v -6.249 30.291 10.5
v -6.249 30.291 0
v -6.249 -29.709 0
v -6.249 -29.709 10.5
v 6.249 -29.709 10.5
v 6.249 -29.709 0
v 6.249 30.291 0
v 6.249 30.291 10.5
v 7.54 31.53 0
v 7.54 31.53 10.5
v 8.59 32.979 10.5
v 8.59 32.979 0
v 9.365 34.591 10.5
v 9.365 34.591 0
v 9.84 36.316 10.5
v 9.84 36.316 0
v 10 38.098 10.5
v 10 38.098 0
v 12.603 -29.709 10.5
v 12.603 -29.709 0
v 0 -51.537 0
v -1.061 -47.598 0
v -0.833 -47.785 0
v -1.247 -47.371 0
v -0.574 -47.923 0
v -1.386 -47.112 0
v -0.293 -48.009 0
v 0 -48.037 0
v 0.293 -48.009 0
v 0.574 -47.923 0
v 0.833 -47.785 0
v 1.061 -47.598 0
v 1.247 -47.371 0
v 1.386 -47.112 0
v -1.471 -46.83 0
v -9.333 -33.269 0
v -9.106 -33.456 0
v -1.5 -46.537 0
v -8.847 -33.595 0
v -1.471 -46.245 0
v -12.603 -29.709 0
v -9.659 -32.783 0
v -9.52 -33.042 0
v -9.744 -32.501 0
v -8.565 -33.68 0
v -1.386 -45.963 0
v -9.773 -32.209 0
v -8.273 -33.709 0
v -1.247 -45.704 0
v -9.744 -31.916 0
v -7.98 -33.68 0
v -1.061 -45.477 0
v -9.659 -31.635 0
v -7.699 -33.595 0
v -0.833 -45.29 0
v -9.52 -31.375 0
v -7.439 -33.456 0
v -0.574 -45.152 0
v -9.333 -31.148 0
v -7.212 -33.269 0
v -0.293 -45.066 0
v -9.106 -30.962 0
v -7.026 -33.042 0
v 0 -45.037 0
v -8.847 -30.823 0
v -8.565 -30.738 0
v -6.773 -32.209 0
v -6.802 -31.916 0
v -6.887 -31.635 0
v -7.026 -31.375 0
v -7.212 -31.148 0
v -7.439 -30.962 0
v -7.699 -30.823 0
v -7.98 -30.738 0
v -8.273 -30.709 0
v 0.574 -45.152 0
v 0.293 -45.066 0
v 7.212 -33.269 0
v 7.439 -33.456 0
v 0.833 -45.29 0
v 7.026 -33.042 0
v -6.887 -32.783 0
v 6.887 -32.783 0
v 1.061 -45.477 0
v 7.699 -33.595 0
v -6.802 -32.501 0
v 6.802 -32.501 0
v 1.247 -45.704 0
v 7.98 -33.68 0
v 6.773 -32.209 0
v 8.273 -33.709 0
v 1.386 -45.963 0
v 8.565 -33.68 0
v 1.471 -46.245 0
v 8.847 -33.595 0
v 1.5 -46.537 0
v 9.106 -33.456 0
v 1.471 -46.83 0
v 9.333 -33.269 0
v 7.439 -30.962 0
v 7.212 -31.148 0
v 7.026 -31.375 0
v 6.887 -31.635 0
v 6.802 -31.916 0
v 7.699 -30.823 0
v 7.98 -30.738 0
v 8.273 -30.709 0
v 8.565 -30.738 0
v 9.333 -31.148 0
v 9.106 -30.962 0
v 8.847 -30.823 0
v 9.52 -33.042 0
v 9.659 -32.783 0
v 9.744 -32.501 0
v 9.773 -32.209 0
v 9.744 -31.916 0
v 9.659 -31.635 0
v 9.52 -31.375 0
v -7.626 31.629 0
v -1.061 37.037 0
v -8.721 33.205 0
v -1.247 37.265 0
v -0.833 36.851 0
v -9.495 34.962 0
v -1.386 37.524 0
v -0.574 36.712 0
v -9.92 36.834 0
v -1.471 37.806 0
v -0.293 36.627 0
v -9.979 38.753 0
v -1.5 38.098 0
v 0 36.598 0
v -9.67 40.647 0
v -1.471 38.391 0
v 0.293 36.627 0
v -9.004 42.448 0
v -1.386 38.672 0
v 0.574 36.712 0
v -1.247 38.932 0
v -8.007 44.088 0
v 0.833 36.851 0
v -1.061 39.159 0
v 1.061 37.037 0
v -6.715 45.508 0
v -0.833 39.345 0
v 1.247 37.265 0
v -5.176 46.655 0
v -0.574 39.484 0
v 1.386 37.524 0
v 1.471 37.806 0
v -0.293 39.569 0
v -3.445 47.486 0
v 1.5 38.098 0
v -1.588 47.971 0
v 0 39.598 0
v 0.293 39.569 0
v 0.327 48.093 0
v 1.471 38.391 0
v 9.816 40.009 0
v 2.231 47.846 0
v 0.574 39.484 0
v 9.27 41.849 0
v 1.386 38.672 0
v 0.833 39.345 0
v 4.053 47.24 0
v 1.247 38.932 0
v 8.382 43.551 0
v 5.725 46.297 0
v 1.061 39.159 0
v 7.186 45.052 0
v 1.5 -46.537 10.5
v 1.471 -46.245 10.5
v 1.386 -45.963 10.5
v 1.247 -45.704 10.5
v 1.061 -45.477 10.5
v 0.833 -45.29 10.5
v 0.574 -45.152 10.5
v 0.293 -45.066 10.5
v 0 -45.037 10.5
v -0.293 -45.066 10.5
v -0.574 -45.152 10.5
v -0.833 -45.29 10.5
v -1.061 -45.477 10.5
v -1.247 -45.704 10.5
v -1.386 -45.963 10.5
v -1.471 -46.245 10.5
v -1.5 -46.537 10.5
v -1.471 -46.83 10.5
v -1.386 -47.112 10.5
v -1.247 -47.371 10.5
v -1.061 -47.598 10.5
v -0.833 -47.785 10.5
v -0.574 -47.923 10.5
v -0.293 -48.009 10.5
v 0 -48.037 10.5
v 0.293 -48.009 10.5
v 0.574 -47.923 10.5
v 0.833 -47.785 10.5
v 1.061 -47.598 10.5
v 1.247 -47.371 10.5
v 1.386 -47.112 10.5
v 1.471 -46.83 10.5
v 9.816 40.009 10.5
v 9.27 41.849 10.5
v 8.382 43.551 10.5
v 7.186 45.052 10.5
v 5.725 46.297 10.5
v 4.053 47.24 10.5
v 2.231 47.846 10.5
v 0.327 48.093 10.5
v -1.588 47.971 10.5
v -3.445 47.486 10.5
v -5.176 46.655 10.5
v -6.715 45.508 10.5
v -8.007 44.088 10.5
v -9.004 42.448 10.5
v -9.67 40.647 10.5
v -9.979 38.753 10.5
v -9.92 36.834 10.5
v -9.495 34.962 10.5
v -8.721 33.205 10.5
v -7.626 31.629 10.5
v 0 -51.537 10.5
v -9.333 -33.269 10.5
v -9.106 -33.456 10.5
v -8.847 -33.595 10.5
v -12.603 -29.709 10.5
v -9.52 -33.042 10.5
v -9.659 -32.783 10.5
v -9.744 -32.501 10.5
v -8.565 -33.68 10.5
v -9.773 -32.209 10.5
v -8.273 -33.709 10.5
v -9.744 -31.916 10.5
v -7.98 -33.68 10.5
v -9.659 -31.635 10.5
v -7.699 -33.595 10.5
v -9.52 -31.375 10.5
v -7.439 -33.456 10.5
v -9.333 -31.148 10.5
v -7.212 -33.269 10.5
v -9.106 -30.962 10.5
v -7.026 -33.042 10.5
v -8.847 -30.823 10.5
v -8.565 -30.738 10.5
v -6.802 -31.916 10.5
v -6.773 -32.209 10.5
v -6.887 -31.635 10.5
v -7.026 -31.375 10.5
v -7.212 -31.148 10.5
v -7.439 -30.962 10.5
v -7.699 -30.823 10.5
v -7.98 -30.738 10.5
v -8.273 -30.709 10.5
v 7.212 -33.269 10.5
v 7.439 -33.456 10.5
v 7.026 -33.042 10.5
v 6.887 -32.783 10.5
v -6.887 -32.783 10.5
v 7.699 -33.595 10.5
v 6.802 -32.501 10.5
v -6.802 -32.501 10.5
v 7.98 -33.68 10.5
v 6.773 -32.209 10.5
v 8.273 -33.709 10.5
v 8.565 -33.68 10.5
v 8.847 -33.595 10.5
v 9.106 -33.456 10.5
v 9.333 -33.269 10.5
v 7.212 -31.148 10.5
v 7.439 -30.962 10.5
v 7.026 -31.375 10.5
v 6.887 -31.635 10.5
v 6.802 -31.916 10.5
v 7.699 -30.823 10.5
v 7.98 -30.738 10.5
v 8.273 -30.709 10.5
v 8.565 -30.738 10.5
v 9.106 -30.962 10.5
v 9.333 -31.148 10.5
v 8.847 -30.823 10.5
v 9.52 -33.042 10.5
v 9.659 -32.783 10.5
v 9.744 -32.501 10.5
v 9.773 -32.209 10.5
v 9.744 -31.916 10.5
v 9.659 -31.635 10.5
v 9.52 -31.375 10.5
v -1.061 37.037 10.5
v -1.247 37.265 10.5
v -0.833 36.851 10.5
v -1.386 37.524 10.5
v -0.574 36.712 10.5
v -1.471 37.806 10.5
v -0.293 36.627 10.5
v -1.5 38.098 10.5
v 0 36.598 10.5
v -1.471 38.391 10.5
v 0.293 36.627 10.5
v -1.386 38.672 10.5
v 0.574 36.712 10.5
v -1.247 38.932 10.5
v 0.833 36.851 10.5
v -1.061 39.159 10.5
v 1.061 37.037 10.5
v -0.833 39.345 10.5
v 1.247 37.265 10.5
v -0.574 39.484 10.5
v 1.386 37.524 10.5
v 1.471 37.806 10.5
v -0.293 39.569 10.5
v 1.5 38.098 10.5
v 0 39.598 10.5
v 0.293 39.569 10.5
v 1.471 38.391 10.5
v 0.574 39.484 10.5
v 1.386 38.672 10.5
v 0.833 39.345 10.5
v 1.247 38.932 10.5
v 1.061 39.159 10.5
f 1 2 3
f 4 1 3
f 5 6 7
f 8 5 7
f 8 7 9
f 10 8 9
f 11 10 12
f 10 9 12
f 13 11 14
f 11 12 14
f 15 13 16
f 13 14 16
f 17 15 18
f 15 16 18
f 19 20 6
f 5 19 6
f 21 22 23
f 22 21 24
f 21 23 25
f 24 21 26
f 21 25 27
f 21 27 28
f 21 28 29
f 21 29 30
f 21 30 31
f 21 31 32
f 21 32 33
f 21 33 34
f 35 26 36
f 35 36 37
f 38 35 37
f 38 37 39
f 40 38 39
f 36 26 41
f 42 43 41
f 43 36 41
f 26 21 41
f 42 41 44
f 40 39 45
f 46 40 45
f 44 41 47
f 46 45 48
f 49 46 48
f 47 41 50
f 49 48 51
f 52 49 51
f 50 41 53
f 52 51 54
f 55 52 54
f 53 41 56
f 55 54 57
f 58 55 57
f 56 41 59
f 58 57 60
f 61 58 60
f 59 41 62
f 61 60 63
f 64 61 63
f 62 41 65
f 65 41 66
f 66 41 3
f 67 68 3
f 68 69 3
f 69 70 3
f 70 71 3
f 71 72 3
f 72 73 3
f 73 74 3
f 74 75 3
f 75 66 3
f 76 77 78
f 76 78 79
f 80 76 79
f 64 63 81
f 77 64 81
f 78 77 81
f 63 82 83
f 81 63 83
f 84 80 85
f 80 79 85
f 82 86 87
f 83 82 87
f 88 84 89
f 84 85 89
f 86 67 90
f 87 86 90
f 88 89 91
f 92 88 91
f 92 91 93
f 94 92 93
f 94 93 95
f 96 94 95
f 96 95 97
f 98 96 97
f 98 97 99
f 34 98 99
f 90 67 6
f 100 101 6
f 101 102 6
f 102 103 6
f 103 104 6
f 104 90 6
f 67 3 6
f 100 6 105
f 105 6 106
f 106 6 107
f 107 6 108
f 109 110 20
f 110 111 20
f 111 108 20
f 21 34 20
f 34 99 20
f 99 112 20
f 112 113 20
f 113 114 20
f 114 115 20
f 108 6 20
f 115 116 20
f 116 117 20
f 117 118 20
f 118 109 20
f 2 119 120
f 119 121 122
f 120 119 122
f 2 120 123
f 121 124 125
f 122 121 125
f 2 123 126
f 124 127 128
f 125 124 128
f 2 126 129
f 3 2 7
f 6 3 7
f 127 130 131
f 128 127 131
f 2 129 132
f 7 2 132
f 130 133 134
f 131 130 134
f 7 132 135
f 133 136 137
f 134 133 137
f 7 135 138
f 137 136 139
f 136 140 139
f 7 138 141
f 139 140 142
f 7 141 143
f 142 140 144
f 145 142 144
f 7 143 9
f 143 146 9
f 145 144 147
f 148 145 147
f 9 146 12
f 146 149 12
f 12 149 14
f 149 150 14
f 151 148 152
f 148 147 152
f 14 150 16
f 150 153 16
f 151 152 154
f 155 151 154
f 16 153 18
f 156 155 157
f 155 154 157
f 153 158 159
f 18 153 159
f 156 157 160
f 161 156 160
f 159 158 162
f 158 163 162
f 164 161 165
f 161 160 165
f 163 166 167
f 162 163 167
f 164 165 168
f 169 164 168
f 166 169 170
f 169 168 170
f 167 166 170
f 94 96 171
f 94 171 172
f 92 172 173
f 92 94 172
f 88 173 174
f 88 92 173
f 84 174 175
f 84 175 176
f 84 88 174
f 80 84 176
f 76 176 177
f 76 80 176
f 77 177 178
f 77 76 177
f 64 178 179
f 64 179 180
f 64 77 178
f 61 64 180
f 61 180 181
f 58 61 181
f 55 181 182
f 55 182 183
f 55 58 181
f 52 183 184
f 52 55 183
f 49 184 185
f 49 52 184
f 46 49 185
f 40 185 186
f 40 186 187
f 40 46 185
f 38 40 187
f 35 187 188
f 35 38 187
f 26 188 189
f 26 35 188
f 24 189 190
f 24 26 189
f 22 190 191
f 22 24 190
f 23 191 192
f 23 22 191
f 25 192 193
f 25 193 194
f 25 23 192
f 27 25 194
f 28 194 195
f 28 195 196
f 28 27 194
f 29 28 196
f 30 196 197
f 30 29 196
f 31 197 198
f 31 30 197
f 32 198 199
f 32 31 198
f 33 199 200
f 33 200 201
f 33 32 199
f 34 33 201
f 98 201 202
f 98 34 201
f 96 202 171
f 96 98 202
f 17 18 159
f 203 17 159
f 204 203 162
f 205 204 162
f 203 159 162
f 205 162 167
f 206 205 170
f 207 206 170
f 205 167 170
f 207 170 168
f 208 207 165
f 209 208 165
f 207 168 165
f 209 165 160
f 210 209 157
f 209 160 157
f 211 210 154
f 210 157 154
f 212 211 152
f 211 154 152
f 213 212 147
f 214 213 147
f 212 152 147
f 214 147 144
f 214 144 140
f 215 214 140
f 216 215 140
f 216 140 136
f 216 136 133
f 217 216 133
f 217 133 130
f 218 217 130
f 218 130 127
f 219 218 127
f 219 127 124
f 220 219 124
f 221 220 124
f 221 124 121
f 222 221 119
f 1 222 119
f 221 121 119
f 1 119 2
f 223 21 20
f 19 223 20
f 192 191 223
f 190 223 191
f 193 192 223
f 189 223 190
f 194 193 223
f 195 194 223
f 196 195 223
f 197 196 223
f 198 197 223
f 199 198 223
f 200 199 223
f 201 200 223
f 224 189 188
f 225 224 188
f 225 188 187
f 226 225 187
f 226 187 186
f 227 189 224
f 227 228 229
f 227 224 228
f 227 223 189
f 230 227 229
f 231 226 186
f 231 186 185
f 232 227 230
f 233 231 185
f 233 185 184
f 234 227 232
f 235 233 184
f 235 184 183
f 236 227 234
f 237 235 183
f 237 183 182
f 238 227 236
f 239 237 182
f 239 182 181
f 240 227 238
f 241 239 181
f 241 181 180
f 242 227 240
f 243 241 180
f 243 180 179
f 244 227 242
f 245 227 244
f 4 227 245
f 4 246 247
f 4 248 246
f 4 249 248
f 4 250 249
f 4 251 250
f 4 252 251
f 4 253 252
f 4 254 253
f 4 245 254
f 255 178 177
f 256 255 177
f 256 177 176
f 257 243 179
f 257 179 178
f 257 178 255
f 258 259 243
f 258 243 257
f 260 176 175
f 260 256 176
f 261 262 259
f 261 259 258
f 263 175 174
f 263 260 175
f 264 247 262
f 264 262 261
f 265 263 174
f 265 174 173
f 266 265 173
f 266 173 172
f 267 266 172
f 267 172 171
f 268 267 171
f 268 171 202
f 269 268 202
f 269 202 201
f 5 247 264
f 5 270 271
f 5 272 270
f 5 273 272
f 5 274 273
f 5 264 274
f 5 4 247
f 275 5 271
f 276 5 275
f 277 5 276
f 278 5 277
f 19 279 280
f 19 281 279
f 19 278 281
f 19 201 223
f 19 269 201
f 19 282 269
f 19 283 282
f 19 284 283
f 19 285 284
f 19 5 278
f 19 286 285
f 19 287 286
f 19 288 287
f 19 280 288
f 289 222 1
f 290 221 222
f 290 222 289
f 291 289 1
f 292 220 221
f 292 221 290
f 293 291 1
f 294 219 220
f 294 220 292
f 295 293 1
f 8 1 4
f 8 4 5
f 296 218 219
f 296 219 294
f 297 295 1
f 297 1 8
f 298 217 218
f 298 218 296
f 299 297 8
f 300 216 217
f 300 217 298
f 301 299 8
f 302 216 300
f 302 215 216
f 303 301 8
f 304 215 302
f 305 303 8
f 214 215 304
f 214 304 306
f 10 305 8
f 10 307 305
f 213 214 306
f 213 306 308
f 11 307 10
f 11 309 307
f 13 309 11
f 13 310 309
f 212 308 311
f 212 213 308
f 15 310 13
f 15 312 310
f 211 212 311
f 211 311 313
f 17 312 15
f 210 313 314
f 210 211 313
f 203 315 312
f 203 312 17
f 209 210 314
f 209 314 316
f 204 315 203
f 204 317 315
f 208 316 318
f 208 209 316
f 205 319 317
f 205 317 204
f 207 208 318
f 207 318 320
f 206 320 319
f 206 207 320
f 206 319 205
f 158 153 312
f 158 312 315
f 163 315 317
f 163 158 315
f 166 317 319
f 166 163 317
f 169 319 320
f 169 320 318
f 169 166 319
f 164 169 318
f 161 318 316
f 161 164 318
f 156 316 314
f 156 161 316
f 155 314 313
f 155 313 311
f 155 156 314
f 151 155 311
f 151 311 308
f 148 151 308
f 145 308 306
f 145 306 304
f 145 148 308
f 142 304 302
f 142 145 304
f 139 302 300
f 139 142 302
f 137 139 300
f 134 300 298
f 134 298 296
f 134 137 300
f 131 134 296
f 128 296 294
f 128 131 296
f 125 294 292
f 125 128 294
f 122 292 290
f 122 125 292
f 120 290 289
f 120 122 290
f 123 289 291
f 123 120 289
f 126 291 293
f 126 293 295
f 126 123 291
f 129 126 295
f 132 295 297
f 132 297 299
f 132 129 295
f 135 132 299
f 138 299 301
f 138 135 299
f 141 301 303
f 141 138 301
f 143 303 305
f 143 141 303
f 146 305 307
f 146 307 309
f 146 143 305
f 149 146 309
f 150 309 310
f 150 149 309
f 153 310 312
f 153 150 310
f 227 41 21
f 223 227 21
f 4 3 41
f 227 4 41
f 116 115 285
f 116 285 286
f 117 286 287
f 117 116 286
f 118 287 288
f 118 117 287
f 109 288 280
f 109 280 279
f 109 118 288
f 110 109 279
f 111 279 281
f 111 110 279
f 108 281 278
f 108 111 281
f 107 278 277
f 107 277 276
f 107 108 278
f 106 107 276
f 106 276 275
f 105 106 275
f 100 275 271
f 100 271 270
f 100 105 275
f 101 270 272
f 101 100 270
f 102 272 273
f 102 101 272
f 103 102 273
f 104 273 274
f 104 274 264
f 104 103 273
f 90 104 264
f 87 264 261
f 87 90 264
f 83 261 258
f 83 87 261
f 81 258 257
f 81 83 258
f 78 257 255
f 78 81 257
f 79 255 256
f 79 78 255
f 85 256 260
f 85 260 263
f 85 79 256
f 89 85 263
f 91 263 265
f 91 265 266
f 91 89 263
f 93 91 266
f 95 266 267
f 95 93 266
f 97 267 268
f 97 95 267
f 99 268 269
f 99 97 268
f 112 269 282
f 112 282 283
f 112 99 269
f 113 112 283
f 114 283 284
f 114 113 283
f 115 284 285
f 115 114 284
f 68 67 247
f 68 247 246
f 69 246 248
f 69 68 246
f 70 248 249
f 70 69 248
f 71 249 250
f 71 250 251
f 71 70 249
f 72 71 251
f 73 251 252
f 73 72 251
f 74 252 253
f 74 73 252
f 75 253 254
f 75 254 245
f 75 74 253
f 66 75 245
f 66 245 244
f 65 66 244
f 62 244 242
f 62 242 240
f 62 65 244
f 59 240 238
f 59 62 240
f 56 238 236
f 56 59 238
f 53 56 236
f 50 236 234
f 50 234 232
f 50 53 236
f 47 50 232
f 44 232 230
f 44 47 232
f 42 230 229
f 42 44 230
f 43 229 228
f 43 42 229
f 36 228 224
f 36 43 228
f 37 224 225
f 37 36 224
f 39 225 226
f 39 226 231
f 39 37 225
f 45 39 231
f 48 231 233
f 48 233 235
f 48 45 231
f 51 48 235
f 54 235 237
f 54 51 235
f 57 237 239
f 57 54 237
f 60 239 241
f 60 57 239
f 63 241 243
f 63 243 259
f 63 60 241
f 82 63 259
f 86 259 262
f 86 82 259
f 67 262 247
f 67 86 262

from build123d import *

# Parameters (mm, degrees)
F0_R     = 1.5
F1_DEPTH = 10.5


with BuildPart() as f1:
    # F0 (on Top) → F1 (new body)
    with BuildSketch(Plane.XY):
        with BuildLine():
            ThreePointArc((6.249218, 30.291278), (9.013661, 33.767573), (10, 38.098151))
            ThreePointArc((10, 38.098151), (-4.330578, 47.111813), (-6.249218, 30.291278))
            ThreePointArc((-6.249218, 30.291278), (0, 28.098151), (6.249218, 30.291278))
        make_face()
        with Locations((0, 38.098151)):
            Circle(F0_R, mode=Mode.SUBTRACT)
        with BuildLine():
            ThreePointArc((6.249218, 30.291278), (0, 28.098151), (-6.249218, 30.291278))
            Line((-6.249218, 30.291278), (-6.249218, -29.708722))
            Line((-6.249218, -29.708722), (6.249218, -29.708722))
            Line((6.249218, -29.708722), (6.249218, 30.291278))
        make_face()
        Polygon((6.249218, -29.708722), (-6.249218, -29.708722), (-12.60285, -29.708722), (0, -51.537499), (12.60285, -29.708722), align=None)
        with Locations((-8.272723, -32.208722)):
            Circle(F0_R, mode=Mode.SUBTRACT)
        with Locations((0, -46.537499)):
            Circle(F0_R, mode=Mode.SUBTRACT)
        with Locations((8.272723, -32.208722)):
            Circle(F0_R, mode=Mode.SUBTRACT)
    extrude(amount=F1_DEPTH)


solid = f1.part
